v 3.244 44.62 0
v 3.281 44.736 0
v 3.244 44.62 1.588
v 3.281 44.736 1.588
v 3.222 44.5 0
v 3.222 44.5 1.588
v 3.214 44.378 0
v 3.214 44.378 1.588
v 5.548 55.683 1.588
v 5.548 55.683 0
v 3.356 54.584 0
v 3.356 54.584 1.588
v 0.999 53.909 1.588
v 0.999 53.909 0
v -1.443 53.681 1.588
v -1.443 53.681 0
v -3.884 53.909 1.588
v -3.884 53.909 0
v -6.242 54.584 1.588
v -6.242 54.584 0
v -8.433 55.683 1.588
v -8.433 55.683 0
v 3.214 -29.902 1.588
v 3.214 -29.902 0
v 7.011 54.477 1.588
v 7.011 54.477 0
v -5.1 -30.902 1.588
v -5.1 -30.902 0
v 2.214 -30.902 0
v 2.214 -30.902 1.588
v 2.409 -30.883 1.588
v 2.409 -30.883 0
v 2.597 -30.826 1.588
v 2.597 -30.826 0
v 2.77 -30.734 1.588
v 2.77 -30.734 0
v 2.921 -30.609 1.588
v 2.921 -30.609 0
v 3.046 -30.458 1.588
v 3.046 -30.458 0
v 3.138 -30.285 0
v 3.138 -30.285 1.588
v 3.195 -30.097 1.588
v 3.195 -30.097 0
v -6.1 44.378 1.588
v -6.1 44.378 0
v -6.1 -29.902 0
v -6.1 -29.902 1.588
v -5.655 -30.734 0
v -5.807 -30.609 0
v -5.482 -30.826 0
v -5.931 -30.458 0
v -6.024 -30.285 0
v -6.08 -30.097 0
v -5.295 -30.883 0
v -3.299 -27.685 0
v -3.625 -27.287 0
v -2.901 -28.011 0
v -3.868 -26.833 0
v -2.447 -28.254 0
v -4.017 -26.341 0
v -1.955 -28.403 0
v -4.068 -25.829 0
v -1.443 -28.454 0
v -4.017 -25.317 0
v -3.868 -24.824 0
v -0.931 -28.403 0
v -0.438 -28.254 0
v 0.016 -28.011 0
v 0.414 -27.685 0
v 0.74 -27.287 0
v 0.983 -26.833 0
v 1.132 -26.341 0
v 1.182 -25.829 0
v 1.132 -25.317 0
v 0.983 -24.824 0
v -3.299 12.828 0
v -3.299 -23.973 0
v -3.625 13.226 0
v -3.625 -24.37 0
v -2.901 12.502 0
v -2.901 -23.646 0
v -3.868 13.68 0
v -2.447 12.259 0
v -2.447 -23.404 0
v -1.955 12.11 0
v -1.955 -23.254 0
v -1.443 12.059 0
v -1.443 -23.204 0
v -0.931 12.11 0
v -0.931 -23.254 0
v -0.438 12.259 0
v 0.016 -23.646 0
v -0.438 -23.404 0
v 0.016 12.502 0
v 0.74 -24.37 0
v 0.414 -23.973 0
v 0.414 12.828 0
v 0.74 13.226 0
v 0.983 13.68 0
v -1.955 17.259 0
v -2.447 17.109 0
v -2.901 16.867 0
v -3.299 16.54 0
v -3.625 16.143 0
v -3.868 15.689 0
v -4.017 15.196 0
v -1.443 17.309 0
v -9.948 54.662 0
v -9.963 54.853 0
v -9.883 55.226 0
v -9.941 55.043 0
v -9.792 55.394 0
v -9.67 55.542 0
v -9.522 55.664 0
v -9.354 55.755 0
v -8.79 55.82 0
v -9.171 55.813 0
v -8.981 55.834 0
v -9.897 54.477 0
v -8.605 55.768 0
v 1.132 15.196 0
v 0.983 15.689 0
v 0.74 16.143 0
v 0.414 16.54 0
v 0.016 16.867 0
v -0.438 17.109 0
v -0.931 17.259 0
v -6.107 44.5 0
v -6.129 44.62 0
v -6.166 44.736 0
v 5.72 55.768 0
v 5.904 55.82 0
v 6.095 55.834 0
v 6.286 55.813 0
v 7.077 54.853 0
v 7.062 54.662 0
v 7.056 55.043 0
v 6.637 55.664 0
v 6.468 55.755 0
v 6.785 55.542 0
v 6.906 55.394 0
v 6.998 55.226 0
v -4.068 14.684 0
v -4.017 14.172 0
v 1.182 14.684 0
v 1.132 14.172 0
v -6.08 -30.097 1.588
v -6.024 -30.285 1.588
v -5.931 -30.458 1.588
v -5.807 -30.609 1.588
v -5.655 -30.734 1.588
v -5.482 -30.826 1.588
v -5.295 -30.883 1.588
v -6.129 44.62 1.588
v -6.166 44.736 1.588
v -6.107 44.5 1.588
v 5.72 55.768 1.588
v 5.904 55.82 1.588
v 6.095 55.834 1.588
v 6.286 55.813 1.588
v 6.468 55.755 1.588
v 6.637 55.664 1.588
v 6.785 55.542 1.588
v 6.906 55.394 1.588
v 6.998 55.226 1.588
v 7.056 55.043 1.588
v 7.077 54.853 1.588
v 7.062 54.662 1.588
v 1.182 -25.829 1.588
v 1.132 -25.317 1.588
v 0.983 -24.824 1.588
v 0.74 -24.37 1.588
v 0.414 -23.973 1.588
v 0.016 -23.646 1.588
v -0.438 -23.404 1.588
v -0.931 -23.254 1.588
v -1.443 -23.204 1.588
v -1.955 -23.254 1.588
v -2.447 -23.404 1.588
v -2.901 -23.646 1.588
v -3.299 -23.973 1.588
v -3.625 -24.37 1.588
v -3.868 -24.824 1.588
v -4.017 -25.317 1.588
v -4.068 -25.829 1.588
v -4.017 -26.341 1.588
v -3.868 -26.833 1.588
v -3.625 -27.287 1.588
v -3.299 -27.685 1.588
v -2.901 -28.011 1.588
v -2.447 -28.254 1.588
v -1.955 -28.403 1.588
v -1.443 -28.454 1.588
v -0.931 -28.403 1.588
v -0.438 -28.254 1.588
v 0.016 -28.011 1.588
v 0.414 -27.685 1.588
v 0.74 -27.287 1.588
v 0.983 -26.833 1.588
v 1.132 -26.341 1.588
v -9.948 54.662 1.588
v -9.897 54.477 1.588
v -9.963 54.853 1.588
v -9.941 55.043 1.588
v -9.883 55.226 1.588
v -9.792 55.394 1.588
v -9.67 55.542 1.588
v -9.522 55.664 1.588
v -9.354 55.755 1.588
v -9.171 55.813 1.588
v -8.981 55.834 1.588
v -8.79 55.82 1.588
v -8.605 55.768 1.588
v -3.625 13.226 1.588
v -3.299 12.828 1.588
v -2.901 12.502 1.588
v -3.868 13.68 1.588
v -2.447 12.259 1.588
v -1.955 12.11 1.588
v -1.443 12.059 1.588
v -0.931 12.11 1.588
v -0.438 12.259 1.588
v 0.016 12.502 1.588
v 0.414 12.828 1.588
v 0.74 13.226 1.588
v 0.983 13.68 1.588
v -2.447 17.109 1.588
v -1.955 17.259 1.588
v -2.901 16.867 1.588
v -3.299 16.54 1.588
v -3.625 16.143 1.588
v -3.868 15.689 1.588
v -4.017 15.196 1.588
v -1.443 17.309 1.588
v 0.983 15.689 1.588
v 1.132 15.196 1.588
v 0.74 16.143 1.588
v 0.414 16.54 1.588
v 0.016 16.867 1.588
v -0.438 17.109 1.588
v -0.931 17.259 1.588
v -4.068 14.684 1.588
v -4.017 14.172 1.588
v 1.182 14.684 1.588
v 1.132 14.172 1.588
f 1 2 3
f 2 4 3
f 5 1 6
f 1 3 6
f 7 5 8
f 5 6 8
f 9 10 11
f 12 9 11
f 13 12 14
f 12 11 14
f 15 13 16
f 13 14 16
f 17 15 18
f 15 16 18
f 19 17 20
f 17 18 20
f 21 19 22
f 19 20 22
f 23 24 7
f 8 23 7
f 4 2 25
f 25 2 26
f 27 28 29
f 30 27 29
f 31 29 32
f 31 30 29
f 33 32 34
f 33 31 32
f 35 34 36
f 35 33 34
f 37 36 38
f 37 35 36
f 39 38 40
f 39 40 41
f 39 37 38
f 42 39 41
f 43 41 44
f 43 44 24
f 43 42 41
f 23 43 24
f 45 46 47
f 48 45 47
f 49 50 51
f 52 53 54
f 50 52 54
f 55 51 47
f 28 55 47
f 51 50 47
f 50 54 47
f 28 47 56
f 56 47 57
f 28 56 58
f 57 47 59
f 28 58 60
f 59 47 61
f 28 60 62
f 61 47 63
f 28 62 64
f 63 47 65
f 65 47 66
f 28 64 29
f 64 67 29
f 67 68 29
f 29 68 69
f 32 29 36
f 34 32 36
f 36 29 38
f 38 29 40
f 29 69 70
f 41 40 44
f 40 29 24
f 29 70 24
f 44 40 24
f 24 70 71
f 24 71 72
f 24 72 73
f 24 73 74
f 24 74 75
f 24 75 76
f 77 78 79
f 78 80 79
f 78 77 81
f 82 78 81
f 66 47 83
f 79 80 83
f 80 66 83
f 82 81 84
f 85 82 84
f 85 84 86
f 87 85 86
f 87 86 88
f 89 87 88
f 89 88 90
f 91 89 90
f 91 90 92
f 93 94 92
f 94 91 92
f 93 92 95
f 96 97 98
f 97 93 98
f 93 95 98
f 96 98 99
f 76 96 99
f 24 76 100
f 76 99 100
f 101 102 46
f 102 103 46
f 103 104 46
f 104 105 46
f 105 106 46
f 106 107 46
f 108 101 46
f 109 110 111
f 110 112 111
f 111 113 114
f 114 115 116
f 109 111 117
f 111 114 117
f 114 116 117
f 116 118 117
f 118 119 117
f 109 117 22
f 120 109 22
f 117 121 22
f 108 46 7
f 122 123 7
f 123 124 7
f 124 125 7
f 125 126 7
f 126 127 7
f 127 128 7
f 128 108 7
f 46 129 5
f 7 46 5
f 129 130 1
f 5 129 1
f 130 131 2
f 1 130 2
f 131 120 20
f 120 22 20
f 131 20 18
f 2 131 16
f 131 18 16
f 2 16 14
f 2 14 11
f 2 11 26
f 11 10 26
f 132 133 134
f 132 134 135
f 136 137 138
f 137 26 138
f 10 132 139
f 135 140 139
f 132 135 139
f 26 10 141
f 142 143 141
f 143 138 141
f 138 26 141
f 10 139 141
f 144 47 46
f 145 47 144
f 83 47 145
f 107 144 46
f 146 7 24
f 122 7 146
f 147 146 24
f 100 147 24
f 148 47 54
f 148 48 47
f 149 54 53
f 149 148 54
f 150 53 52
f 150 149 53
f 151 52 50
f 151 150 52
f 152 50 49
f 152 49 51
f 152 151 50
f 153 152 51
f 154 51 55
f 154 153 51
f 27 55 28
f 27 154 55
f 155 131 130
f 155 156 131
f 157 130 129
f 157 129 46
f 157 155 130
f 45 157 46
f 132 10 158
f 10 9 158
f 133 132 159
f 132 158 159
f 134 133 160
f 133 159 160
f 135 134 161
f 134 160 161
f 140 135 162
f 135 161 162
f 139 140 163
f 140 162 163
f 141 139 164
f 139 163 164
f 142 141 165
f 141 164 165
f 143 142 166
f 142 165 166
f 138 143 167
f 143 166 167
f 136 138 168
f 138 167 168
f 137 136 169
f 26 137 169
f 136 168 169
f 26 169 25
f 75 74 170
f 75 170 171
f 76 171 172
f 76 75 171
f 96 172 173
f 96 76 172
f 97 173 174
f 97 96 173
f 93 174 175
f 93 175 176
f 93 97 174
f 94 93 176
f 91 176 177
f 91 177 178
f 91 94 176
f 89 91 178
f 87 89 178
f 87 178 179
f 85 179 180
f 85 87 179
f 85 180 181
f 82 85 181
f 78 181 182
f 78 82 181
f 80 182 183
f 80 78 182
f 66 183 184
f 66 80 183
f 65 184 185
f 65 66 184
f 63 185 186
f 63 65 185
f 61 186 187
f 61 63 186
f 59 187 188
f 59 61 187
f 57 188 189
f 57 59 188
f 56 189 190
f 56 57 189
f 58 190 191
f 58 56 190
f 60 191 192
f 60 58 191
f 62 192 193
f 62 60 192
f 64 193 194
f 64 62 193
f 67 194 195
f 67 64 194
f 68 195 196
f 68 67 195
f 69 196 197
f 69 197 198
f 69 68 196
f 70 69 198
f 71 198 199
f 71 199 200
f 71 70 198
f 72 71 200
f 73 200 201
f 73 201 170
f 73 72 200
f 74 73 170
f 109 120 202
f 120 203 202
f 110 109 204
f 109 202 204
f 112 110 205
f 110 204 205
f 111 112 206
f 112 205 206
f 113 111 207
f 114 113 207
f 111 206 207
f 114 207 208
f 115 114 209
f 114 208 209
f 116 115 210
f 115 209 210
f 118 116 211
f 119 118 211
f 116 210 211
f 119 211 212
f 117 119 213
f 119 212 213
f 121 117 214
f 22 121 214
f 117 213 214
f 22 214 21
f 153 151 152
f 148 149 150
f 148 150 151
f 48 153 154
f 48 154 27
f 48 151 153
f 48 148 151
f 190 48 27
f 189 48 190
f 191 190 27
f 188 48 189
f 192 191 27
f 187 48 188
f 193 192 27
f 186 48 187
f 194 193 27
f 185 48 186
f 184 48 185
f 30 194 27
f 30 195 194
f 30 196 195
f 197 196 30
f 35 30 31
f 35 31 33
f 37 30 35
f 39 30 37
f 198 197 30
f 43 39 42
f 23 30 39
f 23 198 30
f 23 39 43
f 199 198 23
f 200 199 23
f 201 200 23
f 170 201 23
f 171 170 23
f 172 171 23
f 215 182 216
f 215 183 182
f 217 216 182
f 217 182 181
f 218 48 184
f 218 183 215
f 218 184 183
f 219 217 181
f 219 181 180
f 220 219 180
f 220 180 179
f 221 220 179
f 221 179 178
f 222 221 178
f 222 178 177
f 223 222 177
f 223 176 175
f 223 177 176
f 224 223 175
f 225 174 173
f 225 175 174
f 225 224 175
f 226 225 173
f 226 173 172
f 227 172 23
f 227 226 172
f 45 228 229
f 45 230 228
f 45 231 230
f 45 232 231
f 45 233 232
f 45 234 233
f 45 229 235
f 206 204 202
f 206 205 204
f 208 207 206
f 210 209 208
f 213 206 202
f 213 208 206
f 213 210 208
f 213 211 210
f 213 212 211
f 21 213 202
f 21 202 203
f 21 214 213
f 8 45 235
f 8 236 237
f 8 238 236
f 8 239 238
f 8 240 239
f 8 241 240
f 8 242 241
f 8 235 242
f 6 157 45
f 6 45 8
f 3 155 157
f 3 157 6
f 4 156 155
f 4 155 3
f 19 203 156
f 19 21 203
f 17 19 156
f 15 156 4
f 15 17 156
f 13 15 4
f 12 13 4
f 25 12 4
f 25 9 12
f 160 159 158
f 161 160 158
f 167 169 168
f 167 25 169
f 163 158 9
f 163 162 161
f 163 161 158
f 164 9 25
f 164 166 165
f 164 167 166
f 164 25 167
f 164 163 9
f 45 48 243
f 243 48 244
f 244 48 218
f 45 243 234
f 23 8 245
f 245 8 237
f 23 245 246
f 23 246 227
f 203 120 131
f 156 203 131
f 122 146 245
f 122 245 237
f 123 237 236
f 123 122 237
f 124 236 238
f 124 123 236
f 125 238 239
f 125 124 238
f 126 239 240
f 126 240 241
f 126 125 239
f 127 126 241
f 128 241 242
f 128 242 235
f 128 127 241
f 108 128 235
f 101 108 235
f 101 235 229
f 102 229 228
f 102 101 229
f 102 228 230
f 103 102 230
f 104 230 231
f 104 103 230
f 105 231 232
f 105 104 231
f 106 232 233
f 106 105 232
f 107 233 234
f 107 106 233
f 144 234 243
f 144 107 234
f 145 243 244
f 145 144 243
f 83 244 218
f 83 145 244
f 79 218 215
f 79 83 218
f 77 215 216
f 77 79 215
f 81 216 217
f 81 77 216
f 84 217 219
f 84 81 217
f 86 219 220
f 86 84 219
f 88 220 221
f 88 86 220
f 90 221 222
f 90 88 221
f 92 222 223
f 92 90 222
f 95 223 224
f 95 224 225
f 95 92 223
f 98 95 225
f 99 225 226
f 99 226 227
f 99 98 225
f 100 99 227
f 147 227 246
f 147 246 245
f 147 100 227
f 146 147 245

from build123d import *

# Parameters (mm, degrees)
SKETCH1_R           = 2.625
BOSS_EXTRUDE1_DEPTH = 1.5875
FILLET1_R           = 1


with BuildPart() as part:
    # Sketch1 → Boss-Extrude1 (new body)
    with BuildSketch(Plane.XY):
        with BuildLine():
            Line((-11.271295364, 58.066064539), (-6.099639673, 44.56328746))
            Line((-6.099639673, 44.56328746), (-6.099639673, -30.902312688))
            Line((-6.099639673, -30.902312688), (3.214360327, -30.902312688))
            Line((3.214360327, -30.902312688), (3.214360327, 44.56328746))
            Line((3.214360327, 44.56328746), (8.386016017, 58.066064539))
            ThreePointArc((8.386016017, 58.066064539), (-1.442639673, 53.681260746), (-11.271295364, 58.066064539))
        make_face()
        with Locations((-1.442639673, 14.68417415)):
            Circle(SKETCH1_R, mode=Mode.SUBTRACT)
        with Locations((-1.442639673, -25.828822829)):
            Circle(SKETCH1_R, mode=Mode.SUBTRACT)
    extrude(amount=BOSS_EXTRUDE1_DEPTH)

    # Fillet1
    fillet1_edges = [part.edges().sort_by_distance(p)[0] for p in [
        (3.214360327, -30.902312688, 0.79375),
        (-6.099639673, -30.902312688, 0.79375),
        (-6.099639673, 44.56328746, 0.79375),
        (-11.271295364, 58.066064539, 0.79375),
        (8.386016017, 58.066064539, 0.79375),
        (3.214360327, 44.56328746, 0.79375),
    ]]
    fillet(fillet1_edges, radius=FILLET1_R)


solid = part.part
